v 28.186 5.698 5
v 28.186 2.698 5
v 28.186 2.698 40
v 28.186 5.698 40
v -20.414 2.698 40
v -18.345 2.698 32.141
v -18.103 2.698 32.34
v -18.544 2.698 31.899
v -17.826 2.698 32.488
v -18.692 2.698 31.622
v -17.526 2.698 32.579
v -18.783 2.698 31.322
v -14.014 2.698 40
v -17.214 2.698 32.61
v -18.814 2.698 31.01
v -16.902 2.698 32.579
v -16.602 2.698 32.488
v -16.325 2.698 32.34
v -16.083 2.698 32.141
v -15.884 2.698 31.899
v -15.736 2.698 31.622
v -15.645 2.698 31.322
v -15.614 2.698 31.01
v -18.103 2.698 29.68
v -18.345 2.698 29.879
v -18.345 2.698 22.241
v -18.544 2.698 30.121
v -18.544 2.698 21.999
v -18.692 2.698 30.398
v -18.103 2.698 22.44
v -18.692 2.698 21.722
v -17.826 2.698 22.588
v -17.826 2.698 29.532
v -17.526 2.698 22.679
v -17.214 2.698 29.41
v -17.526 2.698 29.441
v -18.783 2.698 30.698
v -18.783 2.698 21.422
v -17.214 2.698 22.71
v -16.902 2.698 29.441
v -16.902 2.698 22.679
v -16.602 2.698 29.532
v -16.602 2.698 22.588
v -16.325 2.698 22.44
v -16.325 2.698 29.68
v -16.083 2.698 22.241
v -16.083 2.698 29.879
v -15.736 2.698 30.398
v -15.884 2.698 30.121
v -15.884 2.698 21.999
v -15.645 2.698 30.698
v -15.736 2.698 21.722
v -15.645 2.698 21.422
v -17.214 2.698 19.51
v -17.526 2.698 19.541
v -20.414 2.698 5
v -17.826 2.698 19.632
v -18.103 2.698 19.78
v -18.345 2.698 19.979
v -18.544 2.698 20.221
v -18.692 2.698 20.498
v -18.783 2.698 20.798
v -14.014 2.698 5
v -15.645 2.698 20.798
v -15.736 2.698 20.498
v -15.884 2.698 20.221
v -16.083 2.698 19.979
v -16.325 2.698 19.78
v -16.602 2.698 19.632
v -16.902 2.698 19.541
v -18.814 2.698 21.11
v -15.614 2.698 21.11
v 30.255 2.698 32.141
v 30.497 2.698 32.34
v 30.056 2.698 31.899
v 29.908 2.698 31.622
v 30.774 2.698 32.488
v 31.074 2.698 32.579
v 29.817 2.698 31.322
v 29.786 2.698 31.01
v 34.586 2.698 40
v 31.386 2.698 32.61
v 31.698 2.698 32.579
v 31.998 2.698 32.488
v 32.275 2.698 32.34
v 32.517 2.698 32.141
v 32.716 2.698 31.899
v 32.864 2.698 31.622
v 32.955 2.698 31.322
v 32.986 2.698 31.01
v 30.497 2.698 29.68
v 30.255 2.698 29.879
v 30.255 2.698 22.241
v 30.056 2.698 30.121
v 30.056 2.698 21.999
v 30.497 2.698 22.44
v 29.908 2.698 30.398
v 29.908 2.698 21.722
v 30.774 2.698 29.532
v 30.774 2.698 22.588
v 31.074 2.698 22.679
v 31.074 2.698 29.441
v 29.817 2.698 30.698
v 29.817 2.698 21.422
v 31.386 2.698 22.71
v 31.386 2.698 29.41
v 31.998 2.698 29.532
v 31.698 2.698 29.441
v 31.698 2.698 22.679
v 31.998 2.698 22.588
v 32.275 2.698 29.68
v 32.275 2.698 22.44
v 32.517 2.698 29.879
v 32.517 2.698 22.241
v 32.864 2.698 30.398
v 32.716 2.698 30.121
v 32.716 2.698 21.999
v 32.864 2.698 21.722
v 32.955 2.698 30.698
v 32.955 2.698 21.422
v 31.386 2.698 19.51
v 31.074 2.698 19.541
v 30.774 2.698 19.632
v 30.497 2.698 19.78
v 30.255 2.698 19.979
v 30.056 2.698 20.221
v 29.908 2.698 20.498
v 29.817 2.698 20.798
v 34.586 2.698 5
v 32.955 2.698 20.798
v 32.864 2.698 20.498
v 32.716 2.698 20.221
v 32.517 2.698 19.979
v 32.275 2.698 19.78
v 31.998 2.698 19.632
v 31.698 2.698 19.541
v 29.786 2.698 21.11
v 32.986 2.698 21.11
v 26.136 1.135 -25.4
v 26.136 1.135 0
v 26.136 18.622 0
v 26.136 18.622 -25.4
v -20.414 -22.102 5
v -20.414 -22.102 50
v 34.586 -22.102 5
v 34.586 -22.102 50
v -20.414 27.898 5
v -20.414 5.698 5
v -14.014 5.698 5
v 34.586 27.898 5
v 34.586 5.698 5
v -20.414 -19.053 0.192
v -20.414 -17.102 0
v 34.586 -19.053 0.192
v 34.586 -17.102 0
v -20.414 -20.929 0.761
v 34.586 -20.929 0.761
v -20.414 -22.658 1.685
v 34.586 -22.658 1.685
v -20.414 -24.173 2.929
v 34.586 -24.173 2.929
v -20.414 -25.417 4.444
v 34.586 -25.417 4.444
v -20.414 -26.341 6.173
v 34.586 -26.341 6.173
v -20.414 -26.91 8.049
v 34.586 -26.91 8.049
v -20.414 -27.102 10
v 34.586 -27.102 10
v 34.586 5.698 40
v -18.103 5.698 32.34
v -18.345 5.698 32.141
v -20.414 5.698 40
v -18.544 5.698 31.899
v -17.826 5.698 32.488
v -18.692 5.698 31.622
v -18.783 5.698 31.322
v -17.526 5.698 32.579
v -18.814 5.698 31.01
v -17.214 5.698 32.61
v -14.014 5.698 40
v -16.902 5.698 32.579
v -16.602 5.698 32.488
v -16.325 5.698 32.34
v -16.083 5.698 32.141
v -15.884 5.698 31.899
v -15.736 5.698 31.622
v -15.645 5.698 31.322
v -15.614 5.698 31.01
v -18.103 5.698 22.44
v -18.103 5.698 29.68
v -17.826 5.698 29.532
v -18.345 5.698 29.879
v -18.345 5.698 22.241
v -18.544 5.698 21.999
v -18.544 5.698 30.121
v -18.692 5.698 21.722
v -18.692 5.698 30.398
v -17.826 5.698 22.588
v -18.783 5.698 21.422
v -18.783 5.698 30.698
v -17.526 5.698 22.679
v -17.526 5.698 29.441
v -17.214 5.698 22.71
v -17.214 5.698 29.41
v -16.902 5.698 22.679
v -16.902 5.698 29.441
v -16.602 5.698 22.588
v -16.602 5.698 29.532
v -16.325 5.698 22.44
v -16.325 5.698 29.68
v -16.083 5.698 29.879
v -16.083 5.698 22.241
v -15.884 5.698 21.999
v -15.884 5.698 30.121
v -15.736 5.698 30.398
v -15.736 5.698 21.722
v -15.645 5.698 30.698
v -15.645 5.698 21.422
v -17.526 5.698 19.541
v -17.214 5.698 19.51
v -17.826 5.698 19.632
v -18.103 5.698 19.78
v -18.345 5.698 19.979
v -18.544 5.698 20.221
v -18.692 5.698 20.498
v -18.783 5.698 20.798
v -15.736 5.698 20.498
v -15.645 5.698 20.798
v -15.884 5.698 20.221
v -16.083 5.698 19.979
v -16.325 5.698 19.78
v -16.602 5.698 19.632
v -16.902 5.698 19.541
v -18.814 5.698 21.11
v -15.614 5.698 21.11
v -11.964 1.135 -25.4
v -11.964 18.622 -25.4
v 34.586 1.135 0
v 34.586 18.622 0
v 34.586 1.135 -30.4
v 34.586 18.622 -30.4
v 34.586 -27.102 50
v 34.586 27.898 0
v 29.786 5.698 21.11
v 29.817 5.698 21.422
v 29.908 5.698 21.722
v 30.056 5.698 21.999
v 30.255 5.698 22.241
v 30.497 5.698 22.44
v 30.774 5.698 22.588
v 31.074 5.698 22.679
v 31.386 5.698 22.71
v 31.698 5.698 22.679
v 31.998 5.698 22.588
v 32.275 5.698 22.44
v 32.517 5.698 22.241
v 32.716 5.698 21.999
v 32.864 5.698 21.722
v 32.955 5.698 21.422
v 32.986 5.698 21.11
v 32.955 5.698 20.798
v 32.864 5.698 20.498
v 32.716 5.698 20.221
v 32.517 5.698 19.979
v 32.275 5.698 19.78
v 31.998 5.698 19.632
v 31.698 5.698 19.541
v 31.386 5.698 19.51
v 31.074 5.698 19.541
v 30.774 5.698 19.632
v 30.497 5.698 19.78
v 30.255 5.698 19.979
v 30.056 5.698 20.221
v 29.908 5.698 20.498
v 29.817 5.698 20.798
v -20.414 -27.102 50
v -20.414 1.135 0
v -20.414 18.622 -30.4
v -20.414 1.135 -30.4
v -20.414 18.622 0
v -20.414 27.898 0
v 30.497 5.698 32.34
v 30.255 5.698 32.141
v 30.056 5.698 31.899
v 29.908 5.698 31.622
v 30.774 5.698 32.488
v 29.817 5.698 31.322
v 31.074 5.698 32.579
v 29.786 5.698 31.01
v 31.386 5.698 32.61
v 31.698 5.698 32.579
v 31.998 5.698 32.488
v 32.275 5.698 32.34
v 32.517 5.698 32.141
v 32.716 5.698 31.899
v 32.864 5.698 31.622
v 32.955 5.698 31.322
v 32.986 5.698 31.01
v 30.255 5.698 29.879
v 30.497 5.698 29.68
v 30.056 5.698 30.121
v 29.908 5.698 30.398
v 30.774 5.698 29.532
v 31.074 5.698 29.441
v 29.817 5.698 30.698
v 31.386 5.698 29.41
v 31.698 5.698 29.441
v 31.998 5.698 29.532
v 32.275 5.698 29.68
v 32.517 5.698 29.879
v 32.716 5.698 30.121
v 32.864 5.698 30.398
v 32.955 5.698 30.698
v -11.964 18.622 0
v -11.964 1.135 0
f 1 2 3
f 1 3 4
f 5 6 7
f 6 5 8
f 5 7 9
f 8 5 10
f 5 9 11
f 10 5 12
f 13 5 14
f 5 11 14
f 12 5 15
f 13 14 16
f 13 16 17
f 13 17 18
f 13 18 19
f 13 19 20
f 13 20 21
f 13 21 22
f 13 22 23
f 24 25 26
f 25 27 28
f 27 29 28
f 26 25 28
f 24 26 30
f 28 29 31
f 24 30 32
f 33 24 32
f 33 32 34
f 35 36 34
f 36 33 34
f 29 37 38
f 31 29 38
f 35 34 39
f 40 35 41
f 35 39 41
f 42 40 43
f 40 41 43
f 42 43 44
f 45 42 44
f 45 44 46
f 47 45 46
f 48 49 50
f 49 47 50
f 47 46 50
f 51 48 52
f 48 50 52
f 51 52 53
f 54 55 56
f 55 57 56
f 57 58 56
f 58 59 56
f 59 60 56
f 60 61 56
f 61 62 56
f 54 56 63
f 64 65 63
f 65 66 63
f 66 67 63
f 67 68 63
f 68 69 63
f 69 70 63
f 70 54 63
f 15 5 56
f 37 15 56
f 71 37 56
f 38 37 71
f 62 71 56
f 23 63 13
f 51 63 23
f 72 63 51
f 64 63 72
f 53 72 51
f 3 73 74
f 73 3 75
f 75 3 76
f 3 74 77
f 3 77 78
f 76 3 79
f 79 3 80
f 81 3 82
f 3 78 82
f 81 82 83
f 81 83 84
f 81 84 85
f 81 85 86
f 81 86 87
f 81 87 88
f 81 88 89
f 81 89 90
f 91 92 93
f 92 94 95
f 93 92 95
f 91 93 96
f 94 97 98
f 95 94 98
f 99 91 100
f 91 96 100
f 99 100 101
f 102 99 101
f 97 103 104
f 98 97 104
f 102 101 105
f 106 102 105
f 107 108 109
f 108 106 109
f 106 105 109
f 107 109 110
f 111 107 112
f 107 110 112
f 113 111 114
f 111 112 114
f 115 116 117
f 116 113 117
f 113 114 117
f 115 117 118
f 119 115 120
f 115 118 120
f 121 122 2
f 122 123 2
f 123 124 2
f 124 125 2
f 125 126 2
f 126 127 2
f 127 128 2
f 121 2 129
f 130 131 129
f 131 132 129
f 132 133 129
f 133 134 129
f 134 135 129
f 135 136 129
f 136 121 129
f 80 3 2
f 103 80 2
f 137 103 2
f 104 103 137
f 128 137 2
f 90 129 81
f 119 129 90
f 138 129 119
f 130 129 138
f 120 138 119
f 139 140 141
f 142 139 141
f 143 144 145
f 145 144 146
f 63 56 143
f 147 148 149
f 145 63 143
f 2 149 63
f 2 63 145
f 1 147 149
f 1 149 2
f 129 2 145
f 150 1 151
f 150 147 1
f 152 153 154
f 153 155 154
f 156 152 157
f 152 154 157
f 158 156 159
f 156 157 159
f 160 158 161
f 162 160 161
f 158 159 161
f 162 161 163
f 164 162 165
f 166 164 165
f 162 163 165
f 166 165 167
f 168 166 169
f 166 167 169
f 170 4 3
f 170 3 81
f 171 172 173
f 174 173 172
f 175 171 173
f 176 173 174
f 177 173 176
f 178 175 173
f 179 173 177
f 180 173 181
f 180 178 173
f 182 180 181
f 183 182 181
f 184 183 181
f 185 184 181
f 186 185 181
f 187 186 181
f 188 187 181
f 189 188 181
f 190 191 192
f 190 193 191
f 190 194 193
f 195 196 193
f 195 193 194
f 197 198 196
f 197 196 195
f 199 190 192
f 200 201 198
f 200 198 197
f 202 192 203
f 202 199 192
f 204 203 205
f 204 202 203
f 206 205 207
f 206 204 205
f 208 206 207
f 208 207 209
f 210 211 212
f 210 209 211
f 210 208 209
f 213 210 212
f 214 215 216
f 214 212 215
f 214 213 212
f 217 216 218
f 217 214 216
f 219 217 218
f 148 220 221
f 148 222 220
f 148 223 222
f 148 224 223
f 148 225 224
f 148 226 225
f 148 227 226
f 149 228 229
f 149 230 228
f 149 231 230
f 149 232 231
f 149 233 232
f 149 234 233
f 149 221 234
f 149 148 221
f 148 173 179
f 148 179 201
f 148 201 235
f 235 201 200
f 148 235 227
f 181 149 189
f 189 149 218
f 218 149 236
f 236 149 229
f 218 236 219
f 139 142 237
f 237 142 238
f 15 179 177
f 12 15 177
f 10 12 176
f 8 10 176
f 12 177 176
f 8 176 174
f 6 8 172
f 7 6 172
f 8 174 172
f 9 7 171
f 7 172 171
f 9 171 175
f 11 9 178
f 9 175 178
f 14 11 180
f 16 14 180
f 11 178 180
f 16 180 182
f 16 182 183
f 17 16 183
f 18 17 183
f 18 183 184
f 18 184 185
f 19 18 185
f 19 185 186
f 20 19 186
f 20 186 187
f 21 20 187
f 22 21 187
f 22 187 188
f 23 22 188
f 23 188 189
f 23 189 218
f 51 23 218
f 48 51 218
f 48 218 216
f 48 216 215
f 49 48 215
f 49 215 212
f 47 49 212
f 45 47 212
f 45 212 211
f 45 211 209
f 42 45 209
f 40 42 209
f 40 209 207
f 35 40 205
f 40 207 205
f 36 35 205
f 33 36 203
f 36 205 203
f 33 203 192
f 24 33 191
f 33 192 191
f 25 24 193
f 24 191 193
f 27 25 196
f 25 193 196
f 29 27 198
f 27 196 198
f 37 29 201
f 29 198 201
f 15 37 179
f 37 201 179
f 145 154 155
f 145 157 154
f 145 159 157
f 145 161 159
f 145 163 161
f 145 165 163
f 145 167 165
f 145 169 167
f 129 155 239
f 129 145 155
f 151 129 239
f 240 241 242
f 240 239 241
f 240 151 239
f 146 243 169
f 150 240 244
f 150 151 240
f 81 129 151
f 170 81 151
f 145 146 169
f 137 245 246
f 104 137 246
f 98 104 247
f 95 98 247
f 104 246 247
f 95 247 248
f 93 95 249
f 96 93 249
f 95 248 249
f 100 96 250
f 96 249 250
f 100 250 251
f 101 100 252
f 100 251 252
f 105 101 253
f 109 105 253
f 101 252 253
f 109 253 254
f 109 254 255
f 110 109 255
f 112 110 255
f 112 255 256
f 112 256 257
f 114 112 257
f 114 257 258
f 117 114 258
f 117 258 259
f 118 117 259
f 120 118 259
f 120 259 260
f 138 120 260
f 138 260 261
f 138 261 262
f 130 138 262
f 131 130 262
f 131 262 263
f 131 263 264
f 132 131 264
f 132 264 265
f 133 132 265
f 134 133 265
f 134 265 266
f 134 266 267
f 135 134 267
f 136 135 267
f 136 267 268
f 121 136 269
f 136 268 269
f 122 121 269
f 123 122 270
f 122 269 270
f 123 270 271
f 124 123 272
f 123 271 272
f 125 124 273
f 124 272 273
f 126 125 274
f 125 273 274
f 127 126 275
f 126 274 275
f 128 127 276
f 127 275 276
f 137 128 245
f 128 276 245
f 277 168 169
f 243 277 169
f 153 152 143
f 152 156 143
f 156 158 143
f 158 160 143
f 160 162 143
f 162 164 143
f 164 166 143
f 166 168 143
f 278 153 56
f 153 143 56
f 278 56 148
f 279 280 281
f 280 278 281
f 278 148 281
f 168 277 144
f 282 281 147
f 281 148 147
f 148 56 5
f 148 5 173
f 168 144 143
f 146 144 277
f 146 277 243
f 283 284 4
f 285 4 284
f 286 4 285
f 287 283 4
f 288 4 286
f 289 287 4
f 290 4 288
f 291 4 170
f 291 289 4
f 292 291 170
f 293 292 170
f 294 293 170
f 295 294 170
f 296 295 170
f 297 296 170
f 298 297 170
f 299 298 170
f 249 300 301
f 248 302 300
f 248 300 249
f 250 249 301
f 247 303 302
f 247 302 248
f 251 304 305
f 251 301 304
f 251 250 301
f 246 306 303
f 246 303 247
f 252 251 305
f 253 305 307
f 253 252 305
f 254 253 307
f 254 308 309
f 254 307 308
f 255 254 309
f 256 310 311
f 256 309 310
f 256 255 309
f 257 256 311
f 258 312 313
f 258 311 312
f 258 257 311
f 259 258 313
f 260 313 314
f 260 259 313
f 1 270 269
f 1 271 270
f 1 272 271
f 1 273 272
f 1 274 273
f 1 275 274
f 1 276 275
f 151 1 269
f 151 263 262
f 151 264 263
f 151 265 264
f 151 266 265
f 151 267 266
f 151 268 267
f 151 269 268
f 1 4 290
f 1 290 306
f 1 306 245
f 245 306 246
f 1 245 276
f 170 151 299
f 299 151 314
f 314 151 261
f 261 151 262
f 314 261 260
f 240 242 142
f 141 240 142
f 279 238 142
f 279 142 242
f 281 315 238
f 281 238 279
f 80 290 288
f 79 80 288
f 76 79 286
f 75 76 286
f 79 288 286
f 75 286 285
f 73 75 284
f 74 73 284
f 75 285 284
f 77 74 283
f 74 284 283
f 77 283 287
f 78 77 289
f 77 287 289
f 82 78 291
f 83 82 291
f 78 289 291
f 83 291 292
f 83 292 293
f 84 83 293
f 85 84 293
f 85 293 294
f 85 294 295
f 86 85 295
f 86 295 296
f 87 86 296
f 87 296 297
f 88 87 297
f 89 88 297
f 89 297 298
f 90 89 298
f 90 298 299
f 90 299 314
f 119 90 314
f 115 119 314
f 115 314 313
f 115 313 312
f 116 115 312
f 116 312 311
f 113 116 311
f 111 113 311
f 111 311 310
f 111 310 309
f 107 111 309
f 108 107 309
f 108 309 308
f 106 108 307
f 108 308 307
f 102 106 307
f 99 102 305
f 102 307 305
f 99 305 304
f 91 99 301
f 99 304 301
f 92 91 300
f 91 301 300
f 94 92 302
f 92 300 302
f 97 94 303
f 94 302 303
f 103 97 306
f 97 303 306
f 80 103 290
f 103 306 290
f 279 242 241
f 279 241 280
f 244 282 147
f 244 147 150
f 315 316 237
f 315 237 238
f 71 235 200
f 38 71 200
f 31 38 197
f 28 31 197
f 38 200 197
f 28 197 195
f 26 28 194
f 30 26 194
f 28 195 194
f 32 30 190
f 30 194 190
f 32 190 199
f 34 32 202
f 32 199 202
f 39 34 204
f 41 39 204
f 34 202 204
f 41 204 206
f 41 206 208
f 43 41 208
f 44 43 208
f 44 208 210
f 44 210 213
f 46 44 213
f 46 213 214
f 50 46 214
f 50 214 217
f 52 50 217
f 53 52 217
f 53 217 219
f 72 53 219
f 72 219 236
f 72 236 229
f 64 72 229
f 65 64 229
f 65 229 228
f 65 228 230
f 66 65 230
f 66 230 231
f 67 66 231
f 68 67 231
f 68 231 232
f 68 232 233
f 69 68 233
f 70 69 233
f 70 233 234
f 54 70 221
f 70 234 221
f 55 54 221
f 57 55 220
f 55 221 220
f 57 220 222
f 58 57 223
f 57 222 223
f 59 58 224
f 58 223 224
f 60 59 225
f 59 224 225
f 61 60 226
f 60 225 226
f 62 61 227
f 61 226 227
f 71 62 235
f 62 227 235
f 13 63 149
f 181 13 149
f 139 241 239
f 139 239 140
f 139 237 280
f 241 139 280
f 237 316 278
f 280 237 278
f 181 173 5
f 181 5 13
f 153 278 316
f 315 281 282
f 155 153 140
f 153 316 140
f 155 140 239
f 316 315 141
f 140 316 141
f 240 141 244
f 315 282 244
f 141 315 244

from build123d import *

# Parameters (mm, degrees)
SKETCH1_W           = 55
SKETCH1_H           = 55
BOSS_EXTRUDE1_DEPTH = 50
SKETCH2_W           = 55
SKETCH2_H           = 50
CUT_EXTRUDE1_DEPTH  = 45
FILLET2_R           = 10
SKETCH3_W           = 6.4
SKETCH3_H           = 3
BOSS_EXTRUDE2_DEPTH = 35
SKETCH4_R           = 1.6
CUT_EXTRUDE2_DEPTH  = 10
SKETCH5_W           = 8.45
SKETCH5_H           = 17.487110786
BOSS_EXTRUDE3_DEPTH = 25.4
SKETCH6_W           = 55
SKETCH6_H           = 17.487110786
BOSS_EXTRUDE4_DEPTH = 5


with BuildPart() as part:
    # Sketch1 → Boss-Extrude1 (new body)
    with BuildSketch(Plane.XY):
        with Locations((7.085987261, 0.398089172)):
            Rectangle(SKETCH1_W, SKETCH1_H)
    extrude(amount=BOSS_EXTRUDE1_DEPTH)

    # Sketch2 → Cut-Extrude1 (cut)
    with BuildSketch(Plane.XY.offset(50)):
        with Locations((7.085987261, 2.898089172)):
            Rectangle(SKETCH2_W, SKETCH2_H)
    extrude(amount=-CUT_EXTRUDE1_DEPTH, mode=Mode.SUBTRACT)

    # Fillet2
    fillet2_edges = [part.edges().sort_by_distance(p)[0] for p in [
        (7.085987261, -27.101910828, 0),
    ]]
    fillet(fillet2_edges, radius=FILLET2_R)

    # Sketch3 → Boss-Extrude2 (add)
    with BuildSketch(Plane.XY.offset(5)):
        with Locations((-17.214012739, 4.198089172)):
            Rectangle(SKETCH3_W, SKETCH3_H)
        with Locations((31.385987261, 4.198089172)):
            Rectangle(SKETCH3_W, SKETCH3_H)
    extrude(amount=BOSS_EXTRUDE2_DEPTH)

    # Sketch4 → Cut-Extrude2 (cut)
    with BuildSketch(Plane(origin=(0, 5.698089172, 0), x_dir=(1, 0, 0), z_dir=(0, 1, 0))):
        with Locations(Location((-17.214012739, -21.11, 0), (0, 0, 180))):
            Circle(SKETCH4_R)
        with Locations(Location((-17.214012739, -31.01, 0), (0, 0, 180))):
            Circle(SKETCH4_R)
        with Locations(Location((31.385987261, -31.01, 0), (0, 0, 180))):
            Circle(SKETCH4_R)
        with Locations(Location((31.385987261, -21.11, 0), (0, 0, 180))):
            Circle(SKETCH4_R)
    extrude(amount=-CUT_EXTRUDE2_DEPTH, mode=Mode.SUBTRACT)

    # Sketch5 → Boss-Extrude3 (add)
    with BuildSketch(Plane(origin=(0, 0, 0), x_dir=(-1, 0, 0), z_dir=(0, 0, -1))):
        with Locations((-30.360987261, 9.878461031)):
            Rectangle(SKETCH5_W, SKETCH5_H)
        with Locations((16.189012739, 9.878461031)):
            Rectangle(SKETCH5_W, SKETCH5_H)
    extrude(amount=BOSS_EXTRUDE3_DEPTH)

    # Sketch6 → Boss-Extrude4 (add)
    with BuildSketch(Plane(origin=(0, 0, -25.4), x_dir=(-1, 0, 0), z_dir=(0, 0, -1))):
        with Locations((-7.085987261, 9.878461031)):
            Rectangle(SKETCH6_W, SKETCH6_H)
    extrude(amount=BOSS_EXTRUDE4_DEPTH)


solid = part.part
